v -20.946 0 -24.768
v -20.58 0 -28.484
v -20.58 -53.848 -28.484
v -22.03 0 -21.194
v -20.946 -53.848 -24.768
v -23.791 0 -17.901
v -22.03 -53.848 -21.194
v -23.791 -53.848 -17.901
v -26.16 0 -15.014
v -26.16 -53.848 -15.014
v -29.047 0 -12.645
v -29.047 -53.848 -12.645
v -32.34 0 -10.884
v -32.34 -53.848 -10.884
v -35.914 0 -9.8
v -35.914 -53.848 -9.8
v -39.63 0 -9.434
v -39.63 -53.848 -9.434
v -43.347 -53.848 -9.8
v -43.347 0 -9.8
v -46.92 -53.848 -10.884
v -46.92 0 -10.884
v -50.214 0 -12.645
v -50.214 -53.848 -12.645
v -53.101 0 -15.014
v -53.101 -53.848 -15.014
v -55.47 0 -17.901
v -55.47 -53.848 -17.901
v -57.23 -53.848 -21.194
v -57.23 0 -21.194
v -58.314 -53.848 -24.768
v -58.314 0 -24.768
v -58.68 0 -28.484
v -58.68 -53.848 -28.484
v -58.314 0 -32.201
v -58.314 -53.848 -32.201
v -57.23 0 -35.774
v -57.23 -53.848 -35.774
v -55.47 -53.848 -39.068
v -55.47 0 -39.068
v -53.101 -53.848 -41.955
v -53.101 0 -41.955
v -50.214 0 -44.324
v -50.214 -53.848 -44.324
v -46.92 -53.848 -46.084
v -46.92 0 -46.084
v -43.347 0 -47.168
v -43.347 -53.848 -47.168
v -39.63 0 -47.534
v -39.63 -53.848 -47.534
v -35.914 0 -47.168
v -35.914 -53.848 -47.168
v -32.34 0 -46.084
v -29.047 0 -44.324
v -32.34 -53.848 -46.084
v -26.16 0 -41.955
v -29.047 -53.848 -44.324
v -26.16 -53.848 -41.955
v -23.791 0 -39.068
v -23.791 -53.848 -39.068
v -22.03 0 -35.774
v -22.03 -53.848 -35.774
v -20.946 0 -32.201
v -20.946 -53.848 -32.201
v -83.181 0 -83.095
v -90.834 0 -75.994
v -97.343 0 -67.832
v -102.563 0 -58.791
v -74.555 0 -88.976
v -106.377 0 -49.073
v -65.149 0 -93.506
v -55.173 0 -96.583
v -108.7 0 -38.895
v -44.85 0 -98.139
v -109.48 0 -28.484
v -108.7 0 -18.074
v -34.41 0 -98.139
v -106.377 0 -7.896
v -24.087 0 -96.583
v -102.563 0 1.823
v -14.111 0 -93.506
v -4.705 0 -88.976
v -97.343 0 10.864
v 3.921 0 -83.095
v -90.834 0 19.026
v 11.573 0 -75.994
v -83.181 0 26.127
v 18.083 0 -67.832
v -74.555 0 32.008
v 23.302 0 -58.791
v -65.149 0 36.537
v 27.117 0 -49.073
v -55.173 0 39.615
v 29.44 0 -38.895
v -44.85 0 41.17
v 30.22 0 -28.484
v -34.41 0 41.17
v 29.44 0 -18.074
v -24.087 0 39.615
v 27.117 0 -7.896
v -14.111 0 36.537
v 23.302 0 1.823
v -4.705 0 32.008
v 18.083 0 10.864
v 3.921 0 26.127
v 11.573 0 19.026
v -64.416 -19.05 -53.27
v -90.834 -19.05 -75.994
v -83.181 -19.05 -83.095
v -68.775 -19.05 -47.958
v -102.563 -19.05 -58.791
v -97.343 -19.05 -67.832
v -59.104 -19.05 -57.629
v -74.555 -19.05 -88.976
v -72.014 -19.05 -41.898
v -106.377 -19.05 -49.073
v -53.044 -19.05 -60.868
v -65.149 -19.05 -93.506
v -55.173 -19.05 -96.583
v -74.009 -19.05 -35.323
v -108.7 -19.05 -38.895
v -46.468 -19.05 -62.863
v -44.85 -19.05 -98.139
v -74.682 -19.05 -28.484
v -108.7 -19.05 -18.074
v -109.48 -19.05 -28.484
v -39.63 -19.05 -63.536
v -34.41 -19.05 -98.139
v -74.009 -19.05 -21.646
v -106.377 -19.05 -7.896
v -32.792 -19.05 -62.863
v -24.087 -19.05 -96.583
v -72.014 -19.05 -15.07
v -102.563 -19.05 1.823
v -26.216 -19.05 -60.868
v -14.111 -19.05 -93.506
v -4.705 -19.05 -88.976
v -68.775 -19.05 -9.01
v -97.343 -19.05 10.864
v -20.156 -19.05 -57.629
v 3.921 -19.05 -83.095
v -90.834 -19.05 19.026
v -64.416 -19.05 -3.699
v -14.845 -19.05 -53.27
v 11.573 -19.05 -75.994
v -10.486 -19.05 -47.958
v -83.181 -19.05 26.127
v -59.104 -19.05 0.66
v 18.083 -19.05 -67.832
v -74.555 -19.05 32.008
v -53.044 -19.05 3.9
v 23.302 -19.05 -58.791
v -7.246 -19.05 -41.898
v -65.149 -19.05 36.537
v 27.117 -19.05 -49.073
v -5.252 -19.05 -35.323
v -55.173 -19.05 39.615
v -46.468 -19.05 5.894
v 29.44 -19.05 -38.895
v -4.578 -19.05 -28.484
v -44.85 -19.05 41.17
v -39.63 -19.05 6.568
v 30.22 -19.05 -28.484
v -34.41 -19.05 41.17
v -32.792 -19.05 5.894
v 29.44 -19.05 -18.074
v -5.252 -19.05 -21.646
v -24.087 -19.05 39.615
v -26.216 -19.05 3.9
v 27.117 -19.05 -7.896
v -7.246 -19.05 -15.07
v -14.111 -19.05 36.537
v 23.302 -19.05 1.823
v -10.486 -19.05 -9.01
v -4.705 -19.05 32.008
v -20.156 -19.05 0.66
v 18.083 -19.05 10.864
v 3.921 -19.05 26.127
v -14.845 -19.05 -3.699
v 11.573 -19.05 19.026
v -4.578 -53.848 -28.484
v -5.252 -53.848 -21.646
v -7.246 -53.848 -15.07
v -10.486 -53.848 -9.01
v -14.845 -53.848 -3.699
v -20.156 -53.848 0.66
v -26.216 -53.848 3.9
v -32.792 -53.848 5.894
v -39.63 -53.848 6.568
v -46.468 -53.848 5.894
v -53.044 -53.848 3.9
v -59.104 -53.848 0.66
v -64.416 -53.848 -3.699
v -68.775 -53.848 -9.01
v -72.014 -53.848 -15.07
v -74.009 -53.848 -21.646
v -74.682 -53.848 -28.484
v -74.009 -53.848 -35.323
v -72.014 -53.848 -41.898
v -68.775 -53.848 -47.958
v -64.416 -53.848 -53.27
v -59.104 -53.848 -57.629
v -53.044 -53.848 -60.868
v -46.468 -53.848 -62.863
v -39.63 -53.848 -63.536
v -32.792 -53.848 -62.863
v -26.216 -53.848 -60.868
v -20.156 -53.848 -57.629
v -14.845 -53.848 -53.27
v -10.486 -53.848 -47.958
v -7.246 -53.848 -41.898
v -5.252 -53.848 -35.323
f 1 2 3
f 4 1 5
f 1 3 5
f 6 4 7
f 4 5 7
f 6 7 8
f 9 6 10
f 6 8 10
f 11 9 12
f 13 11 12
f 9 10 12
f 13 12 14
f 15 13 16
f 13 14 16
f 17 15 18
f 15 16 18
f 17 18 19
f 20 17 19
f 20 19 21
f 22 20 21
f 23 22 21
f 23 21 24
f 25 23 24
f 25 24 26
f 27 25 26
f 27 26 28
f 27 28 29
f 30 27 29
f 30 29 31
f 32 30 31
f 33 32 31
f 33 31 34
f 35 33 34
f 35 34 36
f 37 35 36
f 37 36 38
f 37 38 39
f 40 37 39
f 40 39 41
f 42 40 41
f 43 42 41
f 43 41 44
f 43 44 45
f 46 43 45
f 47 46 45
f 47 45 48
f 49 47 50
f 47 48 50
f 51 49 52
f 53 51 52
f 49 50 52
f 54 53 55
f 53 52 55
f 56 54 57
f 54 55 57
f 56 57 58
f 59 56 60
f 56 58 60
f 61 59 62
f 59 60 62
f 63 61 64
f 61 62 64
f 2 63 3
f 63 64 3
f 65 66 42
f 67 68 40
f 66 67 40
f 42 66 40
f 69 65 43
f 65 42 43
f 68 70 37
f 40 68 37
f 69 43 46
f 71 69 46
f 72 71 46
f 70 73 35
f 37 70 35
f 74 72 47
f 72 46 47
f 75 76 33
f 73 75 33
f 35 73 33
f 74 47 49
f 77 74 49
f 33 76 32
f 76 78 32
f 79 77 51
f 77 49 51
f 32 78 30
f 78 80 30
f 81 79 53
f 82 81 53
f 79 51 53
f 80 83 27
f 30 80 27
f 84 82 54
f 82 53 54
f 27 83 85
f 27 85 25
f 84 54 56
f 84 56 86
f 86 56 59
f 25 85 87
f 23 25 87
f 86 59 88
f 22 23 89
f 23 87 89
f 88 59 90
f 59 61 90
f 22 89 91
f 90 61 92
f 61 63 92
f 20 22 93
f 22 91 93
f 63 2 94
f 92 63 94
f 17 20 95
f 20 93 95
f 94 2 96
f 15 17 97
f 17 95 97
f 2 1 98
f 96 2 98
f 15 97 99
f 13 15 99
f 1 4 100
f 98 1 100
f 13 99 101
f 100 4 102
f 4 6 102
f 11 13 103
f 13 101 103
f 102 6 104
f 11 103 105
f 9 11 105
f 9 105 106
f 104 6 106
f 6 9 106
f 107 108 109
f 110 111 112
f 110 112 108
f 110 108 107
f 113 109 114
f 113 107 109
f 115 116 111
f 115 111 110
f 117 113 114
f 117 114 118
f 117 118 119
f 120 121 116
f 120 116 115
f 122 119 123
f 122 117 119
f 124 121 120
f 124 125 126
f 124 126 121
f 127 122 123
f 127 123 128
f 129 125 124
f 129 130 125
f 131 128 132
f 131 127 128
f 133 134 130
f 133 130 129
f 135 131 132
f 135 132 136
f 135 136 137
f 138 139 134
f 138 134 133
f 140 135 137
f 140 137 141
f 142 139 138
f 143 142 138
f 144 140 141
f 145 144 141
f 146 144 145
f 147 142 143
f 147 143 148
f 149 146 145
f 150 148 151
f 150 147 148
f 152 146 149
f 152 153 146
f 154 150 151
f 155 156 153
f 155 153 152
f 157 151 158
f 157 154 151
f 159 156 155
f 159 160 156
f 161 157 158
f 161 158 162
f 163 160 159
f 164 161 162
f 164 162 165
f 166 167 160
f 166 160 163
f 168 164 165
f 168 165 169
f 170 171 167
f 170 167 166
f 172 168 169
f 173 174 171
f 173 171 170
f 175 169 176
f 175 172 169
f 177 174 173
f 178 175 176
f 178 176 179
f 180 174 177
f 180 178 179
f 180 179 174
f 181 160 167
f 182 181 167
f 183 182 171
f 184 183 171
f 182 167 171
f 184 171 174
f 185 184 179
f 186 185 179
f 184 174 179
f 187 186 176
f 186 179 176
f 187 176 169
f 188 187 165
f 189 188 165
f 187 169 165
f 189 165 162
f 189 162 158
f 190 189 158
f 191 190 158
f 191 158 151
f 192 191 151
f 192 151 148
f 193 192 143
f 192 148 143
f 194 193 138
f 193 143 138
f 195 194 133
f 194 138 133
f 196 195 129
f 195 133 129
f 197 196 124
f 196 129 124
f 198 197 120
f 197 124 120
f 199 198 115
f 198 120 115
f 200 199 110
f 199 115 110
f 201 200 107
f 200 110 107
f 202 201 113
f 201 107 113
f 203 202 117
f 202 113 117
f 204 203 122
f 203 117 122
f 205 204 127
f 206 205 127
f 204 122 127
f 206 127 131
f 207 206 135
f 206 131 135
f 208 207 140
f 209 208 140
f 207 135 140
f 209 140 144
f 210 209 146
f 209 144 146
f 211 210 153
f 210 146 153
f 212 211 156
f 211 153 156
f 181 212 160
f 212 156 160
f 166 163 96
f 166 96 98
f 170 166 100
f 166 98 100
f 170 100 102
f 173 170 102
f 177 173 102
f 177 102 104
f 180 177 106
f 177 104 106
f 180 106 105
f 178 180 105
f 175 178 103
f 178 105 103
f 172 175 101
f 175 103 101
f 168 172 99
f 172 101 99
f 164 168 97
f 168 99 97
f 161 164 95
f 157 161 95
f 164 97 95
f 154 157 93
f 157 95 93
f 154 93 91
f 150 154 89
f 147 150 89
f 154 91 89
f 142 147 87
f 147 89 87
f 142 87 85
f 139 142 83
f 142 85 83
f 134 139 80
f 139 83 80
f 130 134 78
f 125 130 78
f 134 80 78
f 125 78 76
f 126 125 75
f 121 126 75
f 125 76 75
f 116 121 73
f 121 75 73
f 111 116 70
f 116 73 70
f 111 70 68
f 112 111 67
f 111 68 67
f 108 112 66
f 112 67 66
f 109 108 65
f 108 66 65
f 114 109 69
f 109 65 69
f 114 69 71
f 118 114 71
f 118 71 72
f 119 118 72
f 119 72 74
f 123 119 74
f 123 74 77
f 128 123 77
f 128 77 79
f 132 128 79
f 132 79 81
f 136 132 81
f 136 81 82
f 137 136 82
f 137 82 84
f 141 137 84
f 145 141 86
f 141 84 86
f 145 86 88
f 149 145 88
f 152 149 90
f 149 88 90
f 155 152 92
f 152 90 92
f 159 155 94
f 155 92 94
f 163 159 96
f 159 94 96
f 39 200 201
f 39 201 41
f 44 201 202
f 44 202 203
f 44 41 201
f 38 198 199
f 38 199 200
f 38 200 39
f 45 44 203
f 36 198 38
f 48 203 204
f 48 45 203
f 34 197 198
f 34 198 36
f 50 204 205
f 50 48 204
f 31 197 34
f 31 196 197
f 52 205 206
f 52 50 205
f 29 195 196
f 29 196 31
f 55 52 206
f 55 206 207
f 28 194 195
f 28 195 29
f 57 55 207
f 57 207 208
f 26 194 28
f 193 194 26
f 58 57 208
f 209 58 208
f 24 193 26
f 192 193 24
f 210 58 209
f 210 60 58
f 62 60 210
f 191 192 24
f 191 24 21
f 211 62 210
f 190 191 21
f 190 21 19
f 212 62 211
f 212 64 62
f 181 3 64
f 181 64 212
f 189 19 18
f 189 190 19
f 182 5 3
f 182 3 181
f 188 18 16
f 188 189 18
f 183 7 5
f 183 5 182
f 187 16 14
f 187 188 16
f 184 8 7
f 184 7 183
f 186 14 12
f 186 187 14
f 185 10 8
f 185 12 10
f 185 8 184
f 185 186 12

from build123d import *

# Parameters (mm, degrees)
F0_R     = 69.85
F1_DEPTH = 19.05
F2_R     = 35.052
F3_DEPTH = 34.798
F4_R     = 19.05
F5_DEPTH = 53.849


with BuildPart() as f1:
    # F0 (on Front) → F1 (new body)
    with BuildSketch(Plane.XZ):
        with Locations((-39.630193, -28.484197)):
            Circle(F0_R)
    extrude(amount=F1_DEPTH)

    # F2 (on face) → F3 (join)
    with BuildSketch(Plane.XZ.offset(19.05)):
        with Locations((-39.630193, -28.484197)):
            Circle(F2_R)
    extrude(amount=F3_DEPTH)

    # F4 (on face) → F5 (cut, through all)
    with BuildSketch(Plane.XZ.offset(53.848)):
        with Locations((-39.630193, -28.484197)):
            Circle(F4_R)
    extrude(amount=-F5_DEPTH, mode=Mode.SUBTRACT)


solid = f1.part
